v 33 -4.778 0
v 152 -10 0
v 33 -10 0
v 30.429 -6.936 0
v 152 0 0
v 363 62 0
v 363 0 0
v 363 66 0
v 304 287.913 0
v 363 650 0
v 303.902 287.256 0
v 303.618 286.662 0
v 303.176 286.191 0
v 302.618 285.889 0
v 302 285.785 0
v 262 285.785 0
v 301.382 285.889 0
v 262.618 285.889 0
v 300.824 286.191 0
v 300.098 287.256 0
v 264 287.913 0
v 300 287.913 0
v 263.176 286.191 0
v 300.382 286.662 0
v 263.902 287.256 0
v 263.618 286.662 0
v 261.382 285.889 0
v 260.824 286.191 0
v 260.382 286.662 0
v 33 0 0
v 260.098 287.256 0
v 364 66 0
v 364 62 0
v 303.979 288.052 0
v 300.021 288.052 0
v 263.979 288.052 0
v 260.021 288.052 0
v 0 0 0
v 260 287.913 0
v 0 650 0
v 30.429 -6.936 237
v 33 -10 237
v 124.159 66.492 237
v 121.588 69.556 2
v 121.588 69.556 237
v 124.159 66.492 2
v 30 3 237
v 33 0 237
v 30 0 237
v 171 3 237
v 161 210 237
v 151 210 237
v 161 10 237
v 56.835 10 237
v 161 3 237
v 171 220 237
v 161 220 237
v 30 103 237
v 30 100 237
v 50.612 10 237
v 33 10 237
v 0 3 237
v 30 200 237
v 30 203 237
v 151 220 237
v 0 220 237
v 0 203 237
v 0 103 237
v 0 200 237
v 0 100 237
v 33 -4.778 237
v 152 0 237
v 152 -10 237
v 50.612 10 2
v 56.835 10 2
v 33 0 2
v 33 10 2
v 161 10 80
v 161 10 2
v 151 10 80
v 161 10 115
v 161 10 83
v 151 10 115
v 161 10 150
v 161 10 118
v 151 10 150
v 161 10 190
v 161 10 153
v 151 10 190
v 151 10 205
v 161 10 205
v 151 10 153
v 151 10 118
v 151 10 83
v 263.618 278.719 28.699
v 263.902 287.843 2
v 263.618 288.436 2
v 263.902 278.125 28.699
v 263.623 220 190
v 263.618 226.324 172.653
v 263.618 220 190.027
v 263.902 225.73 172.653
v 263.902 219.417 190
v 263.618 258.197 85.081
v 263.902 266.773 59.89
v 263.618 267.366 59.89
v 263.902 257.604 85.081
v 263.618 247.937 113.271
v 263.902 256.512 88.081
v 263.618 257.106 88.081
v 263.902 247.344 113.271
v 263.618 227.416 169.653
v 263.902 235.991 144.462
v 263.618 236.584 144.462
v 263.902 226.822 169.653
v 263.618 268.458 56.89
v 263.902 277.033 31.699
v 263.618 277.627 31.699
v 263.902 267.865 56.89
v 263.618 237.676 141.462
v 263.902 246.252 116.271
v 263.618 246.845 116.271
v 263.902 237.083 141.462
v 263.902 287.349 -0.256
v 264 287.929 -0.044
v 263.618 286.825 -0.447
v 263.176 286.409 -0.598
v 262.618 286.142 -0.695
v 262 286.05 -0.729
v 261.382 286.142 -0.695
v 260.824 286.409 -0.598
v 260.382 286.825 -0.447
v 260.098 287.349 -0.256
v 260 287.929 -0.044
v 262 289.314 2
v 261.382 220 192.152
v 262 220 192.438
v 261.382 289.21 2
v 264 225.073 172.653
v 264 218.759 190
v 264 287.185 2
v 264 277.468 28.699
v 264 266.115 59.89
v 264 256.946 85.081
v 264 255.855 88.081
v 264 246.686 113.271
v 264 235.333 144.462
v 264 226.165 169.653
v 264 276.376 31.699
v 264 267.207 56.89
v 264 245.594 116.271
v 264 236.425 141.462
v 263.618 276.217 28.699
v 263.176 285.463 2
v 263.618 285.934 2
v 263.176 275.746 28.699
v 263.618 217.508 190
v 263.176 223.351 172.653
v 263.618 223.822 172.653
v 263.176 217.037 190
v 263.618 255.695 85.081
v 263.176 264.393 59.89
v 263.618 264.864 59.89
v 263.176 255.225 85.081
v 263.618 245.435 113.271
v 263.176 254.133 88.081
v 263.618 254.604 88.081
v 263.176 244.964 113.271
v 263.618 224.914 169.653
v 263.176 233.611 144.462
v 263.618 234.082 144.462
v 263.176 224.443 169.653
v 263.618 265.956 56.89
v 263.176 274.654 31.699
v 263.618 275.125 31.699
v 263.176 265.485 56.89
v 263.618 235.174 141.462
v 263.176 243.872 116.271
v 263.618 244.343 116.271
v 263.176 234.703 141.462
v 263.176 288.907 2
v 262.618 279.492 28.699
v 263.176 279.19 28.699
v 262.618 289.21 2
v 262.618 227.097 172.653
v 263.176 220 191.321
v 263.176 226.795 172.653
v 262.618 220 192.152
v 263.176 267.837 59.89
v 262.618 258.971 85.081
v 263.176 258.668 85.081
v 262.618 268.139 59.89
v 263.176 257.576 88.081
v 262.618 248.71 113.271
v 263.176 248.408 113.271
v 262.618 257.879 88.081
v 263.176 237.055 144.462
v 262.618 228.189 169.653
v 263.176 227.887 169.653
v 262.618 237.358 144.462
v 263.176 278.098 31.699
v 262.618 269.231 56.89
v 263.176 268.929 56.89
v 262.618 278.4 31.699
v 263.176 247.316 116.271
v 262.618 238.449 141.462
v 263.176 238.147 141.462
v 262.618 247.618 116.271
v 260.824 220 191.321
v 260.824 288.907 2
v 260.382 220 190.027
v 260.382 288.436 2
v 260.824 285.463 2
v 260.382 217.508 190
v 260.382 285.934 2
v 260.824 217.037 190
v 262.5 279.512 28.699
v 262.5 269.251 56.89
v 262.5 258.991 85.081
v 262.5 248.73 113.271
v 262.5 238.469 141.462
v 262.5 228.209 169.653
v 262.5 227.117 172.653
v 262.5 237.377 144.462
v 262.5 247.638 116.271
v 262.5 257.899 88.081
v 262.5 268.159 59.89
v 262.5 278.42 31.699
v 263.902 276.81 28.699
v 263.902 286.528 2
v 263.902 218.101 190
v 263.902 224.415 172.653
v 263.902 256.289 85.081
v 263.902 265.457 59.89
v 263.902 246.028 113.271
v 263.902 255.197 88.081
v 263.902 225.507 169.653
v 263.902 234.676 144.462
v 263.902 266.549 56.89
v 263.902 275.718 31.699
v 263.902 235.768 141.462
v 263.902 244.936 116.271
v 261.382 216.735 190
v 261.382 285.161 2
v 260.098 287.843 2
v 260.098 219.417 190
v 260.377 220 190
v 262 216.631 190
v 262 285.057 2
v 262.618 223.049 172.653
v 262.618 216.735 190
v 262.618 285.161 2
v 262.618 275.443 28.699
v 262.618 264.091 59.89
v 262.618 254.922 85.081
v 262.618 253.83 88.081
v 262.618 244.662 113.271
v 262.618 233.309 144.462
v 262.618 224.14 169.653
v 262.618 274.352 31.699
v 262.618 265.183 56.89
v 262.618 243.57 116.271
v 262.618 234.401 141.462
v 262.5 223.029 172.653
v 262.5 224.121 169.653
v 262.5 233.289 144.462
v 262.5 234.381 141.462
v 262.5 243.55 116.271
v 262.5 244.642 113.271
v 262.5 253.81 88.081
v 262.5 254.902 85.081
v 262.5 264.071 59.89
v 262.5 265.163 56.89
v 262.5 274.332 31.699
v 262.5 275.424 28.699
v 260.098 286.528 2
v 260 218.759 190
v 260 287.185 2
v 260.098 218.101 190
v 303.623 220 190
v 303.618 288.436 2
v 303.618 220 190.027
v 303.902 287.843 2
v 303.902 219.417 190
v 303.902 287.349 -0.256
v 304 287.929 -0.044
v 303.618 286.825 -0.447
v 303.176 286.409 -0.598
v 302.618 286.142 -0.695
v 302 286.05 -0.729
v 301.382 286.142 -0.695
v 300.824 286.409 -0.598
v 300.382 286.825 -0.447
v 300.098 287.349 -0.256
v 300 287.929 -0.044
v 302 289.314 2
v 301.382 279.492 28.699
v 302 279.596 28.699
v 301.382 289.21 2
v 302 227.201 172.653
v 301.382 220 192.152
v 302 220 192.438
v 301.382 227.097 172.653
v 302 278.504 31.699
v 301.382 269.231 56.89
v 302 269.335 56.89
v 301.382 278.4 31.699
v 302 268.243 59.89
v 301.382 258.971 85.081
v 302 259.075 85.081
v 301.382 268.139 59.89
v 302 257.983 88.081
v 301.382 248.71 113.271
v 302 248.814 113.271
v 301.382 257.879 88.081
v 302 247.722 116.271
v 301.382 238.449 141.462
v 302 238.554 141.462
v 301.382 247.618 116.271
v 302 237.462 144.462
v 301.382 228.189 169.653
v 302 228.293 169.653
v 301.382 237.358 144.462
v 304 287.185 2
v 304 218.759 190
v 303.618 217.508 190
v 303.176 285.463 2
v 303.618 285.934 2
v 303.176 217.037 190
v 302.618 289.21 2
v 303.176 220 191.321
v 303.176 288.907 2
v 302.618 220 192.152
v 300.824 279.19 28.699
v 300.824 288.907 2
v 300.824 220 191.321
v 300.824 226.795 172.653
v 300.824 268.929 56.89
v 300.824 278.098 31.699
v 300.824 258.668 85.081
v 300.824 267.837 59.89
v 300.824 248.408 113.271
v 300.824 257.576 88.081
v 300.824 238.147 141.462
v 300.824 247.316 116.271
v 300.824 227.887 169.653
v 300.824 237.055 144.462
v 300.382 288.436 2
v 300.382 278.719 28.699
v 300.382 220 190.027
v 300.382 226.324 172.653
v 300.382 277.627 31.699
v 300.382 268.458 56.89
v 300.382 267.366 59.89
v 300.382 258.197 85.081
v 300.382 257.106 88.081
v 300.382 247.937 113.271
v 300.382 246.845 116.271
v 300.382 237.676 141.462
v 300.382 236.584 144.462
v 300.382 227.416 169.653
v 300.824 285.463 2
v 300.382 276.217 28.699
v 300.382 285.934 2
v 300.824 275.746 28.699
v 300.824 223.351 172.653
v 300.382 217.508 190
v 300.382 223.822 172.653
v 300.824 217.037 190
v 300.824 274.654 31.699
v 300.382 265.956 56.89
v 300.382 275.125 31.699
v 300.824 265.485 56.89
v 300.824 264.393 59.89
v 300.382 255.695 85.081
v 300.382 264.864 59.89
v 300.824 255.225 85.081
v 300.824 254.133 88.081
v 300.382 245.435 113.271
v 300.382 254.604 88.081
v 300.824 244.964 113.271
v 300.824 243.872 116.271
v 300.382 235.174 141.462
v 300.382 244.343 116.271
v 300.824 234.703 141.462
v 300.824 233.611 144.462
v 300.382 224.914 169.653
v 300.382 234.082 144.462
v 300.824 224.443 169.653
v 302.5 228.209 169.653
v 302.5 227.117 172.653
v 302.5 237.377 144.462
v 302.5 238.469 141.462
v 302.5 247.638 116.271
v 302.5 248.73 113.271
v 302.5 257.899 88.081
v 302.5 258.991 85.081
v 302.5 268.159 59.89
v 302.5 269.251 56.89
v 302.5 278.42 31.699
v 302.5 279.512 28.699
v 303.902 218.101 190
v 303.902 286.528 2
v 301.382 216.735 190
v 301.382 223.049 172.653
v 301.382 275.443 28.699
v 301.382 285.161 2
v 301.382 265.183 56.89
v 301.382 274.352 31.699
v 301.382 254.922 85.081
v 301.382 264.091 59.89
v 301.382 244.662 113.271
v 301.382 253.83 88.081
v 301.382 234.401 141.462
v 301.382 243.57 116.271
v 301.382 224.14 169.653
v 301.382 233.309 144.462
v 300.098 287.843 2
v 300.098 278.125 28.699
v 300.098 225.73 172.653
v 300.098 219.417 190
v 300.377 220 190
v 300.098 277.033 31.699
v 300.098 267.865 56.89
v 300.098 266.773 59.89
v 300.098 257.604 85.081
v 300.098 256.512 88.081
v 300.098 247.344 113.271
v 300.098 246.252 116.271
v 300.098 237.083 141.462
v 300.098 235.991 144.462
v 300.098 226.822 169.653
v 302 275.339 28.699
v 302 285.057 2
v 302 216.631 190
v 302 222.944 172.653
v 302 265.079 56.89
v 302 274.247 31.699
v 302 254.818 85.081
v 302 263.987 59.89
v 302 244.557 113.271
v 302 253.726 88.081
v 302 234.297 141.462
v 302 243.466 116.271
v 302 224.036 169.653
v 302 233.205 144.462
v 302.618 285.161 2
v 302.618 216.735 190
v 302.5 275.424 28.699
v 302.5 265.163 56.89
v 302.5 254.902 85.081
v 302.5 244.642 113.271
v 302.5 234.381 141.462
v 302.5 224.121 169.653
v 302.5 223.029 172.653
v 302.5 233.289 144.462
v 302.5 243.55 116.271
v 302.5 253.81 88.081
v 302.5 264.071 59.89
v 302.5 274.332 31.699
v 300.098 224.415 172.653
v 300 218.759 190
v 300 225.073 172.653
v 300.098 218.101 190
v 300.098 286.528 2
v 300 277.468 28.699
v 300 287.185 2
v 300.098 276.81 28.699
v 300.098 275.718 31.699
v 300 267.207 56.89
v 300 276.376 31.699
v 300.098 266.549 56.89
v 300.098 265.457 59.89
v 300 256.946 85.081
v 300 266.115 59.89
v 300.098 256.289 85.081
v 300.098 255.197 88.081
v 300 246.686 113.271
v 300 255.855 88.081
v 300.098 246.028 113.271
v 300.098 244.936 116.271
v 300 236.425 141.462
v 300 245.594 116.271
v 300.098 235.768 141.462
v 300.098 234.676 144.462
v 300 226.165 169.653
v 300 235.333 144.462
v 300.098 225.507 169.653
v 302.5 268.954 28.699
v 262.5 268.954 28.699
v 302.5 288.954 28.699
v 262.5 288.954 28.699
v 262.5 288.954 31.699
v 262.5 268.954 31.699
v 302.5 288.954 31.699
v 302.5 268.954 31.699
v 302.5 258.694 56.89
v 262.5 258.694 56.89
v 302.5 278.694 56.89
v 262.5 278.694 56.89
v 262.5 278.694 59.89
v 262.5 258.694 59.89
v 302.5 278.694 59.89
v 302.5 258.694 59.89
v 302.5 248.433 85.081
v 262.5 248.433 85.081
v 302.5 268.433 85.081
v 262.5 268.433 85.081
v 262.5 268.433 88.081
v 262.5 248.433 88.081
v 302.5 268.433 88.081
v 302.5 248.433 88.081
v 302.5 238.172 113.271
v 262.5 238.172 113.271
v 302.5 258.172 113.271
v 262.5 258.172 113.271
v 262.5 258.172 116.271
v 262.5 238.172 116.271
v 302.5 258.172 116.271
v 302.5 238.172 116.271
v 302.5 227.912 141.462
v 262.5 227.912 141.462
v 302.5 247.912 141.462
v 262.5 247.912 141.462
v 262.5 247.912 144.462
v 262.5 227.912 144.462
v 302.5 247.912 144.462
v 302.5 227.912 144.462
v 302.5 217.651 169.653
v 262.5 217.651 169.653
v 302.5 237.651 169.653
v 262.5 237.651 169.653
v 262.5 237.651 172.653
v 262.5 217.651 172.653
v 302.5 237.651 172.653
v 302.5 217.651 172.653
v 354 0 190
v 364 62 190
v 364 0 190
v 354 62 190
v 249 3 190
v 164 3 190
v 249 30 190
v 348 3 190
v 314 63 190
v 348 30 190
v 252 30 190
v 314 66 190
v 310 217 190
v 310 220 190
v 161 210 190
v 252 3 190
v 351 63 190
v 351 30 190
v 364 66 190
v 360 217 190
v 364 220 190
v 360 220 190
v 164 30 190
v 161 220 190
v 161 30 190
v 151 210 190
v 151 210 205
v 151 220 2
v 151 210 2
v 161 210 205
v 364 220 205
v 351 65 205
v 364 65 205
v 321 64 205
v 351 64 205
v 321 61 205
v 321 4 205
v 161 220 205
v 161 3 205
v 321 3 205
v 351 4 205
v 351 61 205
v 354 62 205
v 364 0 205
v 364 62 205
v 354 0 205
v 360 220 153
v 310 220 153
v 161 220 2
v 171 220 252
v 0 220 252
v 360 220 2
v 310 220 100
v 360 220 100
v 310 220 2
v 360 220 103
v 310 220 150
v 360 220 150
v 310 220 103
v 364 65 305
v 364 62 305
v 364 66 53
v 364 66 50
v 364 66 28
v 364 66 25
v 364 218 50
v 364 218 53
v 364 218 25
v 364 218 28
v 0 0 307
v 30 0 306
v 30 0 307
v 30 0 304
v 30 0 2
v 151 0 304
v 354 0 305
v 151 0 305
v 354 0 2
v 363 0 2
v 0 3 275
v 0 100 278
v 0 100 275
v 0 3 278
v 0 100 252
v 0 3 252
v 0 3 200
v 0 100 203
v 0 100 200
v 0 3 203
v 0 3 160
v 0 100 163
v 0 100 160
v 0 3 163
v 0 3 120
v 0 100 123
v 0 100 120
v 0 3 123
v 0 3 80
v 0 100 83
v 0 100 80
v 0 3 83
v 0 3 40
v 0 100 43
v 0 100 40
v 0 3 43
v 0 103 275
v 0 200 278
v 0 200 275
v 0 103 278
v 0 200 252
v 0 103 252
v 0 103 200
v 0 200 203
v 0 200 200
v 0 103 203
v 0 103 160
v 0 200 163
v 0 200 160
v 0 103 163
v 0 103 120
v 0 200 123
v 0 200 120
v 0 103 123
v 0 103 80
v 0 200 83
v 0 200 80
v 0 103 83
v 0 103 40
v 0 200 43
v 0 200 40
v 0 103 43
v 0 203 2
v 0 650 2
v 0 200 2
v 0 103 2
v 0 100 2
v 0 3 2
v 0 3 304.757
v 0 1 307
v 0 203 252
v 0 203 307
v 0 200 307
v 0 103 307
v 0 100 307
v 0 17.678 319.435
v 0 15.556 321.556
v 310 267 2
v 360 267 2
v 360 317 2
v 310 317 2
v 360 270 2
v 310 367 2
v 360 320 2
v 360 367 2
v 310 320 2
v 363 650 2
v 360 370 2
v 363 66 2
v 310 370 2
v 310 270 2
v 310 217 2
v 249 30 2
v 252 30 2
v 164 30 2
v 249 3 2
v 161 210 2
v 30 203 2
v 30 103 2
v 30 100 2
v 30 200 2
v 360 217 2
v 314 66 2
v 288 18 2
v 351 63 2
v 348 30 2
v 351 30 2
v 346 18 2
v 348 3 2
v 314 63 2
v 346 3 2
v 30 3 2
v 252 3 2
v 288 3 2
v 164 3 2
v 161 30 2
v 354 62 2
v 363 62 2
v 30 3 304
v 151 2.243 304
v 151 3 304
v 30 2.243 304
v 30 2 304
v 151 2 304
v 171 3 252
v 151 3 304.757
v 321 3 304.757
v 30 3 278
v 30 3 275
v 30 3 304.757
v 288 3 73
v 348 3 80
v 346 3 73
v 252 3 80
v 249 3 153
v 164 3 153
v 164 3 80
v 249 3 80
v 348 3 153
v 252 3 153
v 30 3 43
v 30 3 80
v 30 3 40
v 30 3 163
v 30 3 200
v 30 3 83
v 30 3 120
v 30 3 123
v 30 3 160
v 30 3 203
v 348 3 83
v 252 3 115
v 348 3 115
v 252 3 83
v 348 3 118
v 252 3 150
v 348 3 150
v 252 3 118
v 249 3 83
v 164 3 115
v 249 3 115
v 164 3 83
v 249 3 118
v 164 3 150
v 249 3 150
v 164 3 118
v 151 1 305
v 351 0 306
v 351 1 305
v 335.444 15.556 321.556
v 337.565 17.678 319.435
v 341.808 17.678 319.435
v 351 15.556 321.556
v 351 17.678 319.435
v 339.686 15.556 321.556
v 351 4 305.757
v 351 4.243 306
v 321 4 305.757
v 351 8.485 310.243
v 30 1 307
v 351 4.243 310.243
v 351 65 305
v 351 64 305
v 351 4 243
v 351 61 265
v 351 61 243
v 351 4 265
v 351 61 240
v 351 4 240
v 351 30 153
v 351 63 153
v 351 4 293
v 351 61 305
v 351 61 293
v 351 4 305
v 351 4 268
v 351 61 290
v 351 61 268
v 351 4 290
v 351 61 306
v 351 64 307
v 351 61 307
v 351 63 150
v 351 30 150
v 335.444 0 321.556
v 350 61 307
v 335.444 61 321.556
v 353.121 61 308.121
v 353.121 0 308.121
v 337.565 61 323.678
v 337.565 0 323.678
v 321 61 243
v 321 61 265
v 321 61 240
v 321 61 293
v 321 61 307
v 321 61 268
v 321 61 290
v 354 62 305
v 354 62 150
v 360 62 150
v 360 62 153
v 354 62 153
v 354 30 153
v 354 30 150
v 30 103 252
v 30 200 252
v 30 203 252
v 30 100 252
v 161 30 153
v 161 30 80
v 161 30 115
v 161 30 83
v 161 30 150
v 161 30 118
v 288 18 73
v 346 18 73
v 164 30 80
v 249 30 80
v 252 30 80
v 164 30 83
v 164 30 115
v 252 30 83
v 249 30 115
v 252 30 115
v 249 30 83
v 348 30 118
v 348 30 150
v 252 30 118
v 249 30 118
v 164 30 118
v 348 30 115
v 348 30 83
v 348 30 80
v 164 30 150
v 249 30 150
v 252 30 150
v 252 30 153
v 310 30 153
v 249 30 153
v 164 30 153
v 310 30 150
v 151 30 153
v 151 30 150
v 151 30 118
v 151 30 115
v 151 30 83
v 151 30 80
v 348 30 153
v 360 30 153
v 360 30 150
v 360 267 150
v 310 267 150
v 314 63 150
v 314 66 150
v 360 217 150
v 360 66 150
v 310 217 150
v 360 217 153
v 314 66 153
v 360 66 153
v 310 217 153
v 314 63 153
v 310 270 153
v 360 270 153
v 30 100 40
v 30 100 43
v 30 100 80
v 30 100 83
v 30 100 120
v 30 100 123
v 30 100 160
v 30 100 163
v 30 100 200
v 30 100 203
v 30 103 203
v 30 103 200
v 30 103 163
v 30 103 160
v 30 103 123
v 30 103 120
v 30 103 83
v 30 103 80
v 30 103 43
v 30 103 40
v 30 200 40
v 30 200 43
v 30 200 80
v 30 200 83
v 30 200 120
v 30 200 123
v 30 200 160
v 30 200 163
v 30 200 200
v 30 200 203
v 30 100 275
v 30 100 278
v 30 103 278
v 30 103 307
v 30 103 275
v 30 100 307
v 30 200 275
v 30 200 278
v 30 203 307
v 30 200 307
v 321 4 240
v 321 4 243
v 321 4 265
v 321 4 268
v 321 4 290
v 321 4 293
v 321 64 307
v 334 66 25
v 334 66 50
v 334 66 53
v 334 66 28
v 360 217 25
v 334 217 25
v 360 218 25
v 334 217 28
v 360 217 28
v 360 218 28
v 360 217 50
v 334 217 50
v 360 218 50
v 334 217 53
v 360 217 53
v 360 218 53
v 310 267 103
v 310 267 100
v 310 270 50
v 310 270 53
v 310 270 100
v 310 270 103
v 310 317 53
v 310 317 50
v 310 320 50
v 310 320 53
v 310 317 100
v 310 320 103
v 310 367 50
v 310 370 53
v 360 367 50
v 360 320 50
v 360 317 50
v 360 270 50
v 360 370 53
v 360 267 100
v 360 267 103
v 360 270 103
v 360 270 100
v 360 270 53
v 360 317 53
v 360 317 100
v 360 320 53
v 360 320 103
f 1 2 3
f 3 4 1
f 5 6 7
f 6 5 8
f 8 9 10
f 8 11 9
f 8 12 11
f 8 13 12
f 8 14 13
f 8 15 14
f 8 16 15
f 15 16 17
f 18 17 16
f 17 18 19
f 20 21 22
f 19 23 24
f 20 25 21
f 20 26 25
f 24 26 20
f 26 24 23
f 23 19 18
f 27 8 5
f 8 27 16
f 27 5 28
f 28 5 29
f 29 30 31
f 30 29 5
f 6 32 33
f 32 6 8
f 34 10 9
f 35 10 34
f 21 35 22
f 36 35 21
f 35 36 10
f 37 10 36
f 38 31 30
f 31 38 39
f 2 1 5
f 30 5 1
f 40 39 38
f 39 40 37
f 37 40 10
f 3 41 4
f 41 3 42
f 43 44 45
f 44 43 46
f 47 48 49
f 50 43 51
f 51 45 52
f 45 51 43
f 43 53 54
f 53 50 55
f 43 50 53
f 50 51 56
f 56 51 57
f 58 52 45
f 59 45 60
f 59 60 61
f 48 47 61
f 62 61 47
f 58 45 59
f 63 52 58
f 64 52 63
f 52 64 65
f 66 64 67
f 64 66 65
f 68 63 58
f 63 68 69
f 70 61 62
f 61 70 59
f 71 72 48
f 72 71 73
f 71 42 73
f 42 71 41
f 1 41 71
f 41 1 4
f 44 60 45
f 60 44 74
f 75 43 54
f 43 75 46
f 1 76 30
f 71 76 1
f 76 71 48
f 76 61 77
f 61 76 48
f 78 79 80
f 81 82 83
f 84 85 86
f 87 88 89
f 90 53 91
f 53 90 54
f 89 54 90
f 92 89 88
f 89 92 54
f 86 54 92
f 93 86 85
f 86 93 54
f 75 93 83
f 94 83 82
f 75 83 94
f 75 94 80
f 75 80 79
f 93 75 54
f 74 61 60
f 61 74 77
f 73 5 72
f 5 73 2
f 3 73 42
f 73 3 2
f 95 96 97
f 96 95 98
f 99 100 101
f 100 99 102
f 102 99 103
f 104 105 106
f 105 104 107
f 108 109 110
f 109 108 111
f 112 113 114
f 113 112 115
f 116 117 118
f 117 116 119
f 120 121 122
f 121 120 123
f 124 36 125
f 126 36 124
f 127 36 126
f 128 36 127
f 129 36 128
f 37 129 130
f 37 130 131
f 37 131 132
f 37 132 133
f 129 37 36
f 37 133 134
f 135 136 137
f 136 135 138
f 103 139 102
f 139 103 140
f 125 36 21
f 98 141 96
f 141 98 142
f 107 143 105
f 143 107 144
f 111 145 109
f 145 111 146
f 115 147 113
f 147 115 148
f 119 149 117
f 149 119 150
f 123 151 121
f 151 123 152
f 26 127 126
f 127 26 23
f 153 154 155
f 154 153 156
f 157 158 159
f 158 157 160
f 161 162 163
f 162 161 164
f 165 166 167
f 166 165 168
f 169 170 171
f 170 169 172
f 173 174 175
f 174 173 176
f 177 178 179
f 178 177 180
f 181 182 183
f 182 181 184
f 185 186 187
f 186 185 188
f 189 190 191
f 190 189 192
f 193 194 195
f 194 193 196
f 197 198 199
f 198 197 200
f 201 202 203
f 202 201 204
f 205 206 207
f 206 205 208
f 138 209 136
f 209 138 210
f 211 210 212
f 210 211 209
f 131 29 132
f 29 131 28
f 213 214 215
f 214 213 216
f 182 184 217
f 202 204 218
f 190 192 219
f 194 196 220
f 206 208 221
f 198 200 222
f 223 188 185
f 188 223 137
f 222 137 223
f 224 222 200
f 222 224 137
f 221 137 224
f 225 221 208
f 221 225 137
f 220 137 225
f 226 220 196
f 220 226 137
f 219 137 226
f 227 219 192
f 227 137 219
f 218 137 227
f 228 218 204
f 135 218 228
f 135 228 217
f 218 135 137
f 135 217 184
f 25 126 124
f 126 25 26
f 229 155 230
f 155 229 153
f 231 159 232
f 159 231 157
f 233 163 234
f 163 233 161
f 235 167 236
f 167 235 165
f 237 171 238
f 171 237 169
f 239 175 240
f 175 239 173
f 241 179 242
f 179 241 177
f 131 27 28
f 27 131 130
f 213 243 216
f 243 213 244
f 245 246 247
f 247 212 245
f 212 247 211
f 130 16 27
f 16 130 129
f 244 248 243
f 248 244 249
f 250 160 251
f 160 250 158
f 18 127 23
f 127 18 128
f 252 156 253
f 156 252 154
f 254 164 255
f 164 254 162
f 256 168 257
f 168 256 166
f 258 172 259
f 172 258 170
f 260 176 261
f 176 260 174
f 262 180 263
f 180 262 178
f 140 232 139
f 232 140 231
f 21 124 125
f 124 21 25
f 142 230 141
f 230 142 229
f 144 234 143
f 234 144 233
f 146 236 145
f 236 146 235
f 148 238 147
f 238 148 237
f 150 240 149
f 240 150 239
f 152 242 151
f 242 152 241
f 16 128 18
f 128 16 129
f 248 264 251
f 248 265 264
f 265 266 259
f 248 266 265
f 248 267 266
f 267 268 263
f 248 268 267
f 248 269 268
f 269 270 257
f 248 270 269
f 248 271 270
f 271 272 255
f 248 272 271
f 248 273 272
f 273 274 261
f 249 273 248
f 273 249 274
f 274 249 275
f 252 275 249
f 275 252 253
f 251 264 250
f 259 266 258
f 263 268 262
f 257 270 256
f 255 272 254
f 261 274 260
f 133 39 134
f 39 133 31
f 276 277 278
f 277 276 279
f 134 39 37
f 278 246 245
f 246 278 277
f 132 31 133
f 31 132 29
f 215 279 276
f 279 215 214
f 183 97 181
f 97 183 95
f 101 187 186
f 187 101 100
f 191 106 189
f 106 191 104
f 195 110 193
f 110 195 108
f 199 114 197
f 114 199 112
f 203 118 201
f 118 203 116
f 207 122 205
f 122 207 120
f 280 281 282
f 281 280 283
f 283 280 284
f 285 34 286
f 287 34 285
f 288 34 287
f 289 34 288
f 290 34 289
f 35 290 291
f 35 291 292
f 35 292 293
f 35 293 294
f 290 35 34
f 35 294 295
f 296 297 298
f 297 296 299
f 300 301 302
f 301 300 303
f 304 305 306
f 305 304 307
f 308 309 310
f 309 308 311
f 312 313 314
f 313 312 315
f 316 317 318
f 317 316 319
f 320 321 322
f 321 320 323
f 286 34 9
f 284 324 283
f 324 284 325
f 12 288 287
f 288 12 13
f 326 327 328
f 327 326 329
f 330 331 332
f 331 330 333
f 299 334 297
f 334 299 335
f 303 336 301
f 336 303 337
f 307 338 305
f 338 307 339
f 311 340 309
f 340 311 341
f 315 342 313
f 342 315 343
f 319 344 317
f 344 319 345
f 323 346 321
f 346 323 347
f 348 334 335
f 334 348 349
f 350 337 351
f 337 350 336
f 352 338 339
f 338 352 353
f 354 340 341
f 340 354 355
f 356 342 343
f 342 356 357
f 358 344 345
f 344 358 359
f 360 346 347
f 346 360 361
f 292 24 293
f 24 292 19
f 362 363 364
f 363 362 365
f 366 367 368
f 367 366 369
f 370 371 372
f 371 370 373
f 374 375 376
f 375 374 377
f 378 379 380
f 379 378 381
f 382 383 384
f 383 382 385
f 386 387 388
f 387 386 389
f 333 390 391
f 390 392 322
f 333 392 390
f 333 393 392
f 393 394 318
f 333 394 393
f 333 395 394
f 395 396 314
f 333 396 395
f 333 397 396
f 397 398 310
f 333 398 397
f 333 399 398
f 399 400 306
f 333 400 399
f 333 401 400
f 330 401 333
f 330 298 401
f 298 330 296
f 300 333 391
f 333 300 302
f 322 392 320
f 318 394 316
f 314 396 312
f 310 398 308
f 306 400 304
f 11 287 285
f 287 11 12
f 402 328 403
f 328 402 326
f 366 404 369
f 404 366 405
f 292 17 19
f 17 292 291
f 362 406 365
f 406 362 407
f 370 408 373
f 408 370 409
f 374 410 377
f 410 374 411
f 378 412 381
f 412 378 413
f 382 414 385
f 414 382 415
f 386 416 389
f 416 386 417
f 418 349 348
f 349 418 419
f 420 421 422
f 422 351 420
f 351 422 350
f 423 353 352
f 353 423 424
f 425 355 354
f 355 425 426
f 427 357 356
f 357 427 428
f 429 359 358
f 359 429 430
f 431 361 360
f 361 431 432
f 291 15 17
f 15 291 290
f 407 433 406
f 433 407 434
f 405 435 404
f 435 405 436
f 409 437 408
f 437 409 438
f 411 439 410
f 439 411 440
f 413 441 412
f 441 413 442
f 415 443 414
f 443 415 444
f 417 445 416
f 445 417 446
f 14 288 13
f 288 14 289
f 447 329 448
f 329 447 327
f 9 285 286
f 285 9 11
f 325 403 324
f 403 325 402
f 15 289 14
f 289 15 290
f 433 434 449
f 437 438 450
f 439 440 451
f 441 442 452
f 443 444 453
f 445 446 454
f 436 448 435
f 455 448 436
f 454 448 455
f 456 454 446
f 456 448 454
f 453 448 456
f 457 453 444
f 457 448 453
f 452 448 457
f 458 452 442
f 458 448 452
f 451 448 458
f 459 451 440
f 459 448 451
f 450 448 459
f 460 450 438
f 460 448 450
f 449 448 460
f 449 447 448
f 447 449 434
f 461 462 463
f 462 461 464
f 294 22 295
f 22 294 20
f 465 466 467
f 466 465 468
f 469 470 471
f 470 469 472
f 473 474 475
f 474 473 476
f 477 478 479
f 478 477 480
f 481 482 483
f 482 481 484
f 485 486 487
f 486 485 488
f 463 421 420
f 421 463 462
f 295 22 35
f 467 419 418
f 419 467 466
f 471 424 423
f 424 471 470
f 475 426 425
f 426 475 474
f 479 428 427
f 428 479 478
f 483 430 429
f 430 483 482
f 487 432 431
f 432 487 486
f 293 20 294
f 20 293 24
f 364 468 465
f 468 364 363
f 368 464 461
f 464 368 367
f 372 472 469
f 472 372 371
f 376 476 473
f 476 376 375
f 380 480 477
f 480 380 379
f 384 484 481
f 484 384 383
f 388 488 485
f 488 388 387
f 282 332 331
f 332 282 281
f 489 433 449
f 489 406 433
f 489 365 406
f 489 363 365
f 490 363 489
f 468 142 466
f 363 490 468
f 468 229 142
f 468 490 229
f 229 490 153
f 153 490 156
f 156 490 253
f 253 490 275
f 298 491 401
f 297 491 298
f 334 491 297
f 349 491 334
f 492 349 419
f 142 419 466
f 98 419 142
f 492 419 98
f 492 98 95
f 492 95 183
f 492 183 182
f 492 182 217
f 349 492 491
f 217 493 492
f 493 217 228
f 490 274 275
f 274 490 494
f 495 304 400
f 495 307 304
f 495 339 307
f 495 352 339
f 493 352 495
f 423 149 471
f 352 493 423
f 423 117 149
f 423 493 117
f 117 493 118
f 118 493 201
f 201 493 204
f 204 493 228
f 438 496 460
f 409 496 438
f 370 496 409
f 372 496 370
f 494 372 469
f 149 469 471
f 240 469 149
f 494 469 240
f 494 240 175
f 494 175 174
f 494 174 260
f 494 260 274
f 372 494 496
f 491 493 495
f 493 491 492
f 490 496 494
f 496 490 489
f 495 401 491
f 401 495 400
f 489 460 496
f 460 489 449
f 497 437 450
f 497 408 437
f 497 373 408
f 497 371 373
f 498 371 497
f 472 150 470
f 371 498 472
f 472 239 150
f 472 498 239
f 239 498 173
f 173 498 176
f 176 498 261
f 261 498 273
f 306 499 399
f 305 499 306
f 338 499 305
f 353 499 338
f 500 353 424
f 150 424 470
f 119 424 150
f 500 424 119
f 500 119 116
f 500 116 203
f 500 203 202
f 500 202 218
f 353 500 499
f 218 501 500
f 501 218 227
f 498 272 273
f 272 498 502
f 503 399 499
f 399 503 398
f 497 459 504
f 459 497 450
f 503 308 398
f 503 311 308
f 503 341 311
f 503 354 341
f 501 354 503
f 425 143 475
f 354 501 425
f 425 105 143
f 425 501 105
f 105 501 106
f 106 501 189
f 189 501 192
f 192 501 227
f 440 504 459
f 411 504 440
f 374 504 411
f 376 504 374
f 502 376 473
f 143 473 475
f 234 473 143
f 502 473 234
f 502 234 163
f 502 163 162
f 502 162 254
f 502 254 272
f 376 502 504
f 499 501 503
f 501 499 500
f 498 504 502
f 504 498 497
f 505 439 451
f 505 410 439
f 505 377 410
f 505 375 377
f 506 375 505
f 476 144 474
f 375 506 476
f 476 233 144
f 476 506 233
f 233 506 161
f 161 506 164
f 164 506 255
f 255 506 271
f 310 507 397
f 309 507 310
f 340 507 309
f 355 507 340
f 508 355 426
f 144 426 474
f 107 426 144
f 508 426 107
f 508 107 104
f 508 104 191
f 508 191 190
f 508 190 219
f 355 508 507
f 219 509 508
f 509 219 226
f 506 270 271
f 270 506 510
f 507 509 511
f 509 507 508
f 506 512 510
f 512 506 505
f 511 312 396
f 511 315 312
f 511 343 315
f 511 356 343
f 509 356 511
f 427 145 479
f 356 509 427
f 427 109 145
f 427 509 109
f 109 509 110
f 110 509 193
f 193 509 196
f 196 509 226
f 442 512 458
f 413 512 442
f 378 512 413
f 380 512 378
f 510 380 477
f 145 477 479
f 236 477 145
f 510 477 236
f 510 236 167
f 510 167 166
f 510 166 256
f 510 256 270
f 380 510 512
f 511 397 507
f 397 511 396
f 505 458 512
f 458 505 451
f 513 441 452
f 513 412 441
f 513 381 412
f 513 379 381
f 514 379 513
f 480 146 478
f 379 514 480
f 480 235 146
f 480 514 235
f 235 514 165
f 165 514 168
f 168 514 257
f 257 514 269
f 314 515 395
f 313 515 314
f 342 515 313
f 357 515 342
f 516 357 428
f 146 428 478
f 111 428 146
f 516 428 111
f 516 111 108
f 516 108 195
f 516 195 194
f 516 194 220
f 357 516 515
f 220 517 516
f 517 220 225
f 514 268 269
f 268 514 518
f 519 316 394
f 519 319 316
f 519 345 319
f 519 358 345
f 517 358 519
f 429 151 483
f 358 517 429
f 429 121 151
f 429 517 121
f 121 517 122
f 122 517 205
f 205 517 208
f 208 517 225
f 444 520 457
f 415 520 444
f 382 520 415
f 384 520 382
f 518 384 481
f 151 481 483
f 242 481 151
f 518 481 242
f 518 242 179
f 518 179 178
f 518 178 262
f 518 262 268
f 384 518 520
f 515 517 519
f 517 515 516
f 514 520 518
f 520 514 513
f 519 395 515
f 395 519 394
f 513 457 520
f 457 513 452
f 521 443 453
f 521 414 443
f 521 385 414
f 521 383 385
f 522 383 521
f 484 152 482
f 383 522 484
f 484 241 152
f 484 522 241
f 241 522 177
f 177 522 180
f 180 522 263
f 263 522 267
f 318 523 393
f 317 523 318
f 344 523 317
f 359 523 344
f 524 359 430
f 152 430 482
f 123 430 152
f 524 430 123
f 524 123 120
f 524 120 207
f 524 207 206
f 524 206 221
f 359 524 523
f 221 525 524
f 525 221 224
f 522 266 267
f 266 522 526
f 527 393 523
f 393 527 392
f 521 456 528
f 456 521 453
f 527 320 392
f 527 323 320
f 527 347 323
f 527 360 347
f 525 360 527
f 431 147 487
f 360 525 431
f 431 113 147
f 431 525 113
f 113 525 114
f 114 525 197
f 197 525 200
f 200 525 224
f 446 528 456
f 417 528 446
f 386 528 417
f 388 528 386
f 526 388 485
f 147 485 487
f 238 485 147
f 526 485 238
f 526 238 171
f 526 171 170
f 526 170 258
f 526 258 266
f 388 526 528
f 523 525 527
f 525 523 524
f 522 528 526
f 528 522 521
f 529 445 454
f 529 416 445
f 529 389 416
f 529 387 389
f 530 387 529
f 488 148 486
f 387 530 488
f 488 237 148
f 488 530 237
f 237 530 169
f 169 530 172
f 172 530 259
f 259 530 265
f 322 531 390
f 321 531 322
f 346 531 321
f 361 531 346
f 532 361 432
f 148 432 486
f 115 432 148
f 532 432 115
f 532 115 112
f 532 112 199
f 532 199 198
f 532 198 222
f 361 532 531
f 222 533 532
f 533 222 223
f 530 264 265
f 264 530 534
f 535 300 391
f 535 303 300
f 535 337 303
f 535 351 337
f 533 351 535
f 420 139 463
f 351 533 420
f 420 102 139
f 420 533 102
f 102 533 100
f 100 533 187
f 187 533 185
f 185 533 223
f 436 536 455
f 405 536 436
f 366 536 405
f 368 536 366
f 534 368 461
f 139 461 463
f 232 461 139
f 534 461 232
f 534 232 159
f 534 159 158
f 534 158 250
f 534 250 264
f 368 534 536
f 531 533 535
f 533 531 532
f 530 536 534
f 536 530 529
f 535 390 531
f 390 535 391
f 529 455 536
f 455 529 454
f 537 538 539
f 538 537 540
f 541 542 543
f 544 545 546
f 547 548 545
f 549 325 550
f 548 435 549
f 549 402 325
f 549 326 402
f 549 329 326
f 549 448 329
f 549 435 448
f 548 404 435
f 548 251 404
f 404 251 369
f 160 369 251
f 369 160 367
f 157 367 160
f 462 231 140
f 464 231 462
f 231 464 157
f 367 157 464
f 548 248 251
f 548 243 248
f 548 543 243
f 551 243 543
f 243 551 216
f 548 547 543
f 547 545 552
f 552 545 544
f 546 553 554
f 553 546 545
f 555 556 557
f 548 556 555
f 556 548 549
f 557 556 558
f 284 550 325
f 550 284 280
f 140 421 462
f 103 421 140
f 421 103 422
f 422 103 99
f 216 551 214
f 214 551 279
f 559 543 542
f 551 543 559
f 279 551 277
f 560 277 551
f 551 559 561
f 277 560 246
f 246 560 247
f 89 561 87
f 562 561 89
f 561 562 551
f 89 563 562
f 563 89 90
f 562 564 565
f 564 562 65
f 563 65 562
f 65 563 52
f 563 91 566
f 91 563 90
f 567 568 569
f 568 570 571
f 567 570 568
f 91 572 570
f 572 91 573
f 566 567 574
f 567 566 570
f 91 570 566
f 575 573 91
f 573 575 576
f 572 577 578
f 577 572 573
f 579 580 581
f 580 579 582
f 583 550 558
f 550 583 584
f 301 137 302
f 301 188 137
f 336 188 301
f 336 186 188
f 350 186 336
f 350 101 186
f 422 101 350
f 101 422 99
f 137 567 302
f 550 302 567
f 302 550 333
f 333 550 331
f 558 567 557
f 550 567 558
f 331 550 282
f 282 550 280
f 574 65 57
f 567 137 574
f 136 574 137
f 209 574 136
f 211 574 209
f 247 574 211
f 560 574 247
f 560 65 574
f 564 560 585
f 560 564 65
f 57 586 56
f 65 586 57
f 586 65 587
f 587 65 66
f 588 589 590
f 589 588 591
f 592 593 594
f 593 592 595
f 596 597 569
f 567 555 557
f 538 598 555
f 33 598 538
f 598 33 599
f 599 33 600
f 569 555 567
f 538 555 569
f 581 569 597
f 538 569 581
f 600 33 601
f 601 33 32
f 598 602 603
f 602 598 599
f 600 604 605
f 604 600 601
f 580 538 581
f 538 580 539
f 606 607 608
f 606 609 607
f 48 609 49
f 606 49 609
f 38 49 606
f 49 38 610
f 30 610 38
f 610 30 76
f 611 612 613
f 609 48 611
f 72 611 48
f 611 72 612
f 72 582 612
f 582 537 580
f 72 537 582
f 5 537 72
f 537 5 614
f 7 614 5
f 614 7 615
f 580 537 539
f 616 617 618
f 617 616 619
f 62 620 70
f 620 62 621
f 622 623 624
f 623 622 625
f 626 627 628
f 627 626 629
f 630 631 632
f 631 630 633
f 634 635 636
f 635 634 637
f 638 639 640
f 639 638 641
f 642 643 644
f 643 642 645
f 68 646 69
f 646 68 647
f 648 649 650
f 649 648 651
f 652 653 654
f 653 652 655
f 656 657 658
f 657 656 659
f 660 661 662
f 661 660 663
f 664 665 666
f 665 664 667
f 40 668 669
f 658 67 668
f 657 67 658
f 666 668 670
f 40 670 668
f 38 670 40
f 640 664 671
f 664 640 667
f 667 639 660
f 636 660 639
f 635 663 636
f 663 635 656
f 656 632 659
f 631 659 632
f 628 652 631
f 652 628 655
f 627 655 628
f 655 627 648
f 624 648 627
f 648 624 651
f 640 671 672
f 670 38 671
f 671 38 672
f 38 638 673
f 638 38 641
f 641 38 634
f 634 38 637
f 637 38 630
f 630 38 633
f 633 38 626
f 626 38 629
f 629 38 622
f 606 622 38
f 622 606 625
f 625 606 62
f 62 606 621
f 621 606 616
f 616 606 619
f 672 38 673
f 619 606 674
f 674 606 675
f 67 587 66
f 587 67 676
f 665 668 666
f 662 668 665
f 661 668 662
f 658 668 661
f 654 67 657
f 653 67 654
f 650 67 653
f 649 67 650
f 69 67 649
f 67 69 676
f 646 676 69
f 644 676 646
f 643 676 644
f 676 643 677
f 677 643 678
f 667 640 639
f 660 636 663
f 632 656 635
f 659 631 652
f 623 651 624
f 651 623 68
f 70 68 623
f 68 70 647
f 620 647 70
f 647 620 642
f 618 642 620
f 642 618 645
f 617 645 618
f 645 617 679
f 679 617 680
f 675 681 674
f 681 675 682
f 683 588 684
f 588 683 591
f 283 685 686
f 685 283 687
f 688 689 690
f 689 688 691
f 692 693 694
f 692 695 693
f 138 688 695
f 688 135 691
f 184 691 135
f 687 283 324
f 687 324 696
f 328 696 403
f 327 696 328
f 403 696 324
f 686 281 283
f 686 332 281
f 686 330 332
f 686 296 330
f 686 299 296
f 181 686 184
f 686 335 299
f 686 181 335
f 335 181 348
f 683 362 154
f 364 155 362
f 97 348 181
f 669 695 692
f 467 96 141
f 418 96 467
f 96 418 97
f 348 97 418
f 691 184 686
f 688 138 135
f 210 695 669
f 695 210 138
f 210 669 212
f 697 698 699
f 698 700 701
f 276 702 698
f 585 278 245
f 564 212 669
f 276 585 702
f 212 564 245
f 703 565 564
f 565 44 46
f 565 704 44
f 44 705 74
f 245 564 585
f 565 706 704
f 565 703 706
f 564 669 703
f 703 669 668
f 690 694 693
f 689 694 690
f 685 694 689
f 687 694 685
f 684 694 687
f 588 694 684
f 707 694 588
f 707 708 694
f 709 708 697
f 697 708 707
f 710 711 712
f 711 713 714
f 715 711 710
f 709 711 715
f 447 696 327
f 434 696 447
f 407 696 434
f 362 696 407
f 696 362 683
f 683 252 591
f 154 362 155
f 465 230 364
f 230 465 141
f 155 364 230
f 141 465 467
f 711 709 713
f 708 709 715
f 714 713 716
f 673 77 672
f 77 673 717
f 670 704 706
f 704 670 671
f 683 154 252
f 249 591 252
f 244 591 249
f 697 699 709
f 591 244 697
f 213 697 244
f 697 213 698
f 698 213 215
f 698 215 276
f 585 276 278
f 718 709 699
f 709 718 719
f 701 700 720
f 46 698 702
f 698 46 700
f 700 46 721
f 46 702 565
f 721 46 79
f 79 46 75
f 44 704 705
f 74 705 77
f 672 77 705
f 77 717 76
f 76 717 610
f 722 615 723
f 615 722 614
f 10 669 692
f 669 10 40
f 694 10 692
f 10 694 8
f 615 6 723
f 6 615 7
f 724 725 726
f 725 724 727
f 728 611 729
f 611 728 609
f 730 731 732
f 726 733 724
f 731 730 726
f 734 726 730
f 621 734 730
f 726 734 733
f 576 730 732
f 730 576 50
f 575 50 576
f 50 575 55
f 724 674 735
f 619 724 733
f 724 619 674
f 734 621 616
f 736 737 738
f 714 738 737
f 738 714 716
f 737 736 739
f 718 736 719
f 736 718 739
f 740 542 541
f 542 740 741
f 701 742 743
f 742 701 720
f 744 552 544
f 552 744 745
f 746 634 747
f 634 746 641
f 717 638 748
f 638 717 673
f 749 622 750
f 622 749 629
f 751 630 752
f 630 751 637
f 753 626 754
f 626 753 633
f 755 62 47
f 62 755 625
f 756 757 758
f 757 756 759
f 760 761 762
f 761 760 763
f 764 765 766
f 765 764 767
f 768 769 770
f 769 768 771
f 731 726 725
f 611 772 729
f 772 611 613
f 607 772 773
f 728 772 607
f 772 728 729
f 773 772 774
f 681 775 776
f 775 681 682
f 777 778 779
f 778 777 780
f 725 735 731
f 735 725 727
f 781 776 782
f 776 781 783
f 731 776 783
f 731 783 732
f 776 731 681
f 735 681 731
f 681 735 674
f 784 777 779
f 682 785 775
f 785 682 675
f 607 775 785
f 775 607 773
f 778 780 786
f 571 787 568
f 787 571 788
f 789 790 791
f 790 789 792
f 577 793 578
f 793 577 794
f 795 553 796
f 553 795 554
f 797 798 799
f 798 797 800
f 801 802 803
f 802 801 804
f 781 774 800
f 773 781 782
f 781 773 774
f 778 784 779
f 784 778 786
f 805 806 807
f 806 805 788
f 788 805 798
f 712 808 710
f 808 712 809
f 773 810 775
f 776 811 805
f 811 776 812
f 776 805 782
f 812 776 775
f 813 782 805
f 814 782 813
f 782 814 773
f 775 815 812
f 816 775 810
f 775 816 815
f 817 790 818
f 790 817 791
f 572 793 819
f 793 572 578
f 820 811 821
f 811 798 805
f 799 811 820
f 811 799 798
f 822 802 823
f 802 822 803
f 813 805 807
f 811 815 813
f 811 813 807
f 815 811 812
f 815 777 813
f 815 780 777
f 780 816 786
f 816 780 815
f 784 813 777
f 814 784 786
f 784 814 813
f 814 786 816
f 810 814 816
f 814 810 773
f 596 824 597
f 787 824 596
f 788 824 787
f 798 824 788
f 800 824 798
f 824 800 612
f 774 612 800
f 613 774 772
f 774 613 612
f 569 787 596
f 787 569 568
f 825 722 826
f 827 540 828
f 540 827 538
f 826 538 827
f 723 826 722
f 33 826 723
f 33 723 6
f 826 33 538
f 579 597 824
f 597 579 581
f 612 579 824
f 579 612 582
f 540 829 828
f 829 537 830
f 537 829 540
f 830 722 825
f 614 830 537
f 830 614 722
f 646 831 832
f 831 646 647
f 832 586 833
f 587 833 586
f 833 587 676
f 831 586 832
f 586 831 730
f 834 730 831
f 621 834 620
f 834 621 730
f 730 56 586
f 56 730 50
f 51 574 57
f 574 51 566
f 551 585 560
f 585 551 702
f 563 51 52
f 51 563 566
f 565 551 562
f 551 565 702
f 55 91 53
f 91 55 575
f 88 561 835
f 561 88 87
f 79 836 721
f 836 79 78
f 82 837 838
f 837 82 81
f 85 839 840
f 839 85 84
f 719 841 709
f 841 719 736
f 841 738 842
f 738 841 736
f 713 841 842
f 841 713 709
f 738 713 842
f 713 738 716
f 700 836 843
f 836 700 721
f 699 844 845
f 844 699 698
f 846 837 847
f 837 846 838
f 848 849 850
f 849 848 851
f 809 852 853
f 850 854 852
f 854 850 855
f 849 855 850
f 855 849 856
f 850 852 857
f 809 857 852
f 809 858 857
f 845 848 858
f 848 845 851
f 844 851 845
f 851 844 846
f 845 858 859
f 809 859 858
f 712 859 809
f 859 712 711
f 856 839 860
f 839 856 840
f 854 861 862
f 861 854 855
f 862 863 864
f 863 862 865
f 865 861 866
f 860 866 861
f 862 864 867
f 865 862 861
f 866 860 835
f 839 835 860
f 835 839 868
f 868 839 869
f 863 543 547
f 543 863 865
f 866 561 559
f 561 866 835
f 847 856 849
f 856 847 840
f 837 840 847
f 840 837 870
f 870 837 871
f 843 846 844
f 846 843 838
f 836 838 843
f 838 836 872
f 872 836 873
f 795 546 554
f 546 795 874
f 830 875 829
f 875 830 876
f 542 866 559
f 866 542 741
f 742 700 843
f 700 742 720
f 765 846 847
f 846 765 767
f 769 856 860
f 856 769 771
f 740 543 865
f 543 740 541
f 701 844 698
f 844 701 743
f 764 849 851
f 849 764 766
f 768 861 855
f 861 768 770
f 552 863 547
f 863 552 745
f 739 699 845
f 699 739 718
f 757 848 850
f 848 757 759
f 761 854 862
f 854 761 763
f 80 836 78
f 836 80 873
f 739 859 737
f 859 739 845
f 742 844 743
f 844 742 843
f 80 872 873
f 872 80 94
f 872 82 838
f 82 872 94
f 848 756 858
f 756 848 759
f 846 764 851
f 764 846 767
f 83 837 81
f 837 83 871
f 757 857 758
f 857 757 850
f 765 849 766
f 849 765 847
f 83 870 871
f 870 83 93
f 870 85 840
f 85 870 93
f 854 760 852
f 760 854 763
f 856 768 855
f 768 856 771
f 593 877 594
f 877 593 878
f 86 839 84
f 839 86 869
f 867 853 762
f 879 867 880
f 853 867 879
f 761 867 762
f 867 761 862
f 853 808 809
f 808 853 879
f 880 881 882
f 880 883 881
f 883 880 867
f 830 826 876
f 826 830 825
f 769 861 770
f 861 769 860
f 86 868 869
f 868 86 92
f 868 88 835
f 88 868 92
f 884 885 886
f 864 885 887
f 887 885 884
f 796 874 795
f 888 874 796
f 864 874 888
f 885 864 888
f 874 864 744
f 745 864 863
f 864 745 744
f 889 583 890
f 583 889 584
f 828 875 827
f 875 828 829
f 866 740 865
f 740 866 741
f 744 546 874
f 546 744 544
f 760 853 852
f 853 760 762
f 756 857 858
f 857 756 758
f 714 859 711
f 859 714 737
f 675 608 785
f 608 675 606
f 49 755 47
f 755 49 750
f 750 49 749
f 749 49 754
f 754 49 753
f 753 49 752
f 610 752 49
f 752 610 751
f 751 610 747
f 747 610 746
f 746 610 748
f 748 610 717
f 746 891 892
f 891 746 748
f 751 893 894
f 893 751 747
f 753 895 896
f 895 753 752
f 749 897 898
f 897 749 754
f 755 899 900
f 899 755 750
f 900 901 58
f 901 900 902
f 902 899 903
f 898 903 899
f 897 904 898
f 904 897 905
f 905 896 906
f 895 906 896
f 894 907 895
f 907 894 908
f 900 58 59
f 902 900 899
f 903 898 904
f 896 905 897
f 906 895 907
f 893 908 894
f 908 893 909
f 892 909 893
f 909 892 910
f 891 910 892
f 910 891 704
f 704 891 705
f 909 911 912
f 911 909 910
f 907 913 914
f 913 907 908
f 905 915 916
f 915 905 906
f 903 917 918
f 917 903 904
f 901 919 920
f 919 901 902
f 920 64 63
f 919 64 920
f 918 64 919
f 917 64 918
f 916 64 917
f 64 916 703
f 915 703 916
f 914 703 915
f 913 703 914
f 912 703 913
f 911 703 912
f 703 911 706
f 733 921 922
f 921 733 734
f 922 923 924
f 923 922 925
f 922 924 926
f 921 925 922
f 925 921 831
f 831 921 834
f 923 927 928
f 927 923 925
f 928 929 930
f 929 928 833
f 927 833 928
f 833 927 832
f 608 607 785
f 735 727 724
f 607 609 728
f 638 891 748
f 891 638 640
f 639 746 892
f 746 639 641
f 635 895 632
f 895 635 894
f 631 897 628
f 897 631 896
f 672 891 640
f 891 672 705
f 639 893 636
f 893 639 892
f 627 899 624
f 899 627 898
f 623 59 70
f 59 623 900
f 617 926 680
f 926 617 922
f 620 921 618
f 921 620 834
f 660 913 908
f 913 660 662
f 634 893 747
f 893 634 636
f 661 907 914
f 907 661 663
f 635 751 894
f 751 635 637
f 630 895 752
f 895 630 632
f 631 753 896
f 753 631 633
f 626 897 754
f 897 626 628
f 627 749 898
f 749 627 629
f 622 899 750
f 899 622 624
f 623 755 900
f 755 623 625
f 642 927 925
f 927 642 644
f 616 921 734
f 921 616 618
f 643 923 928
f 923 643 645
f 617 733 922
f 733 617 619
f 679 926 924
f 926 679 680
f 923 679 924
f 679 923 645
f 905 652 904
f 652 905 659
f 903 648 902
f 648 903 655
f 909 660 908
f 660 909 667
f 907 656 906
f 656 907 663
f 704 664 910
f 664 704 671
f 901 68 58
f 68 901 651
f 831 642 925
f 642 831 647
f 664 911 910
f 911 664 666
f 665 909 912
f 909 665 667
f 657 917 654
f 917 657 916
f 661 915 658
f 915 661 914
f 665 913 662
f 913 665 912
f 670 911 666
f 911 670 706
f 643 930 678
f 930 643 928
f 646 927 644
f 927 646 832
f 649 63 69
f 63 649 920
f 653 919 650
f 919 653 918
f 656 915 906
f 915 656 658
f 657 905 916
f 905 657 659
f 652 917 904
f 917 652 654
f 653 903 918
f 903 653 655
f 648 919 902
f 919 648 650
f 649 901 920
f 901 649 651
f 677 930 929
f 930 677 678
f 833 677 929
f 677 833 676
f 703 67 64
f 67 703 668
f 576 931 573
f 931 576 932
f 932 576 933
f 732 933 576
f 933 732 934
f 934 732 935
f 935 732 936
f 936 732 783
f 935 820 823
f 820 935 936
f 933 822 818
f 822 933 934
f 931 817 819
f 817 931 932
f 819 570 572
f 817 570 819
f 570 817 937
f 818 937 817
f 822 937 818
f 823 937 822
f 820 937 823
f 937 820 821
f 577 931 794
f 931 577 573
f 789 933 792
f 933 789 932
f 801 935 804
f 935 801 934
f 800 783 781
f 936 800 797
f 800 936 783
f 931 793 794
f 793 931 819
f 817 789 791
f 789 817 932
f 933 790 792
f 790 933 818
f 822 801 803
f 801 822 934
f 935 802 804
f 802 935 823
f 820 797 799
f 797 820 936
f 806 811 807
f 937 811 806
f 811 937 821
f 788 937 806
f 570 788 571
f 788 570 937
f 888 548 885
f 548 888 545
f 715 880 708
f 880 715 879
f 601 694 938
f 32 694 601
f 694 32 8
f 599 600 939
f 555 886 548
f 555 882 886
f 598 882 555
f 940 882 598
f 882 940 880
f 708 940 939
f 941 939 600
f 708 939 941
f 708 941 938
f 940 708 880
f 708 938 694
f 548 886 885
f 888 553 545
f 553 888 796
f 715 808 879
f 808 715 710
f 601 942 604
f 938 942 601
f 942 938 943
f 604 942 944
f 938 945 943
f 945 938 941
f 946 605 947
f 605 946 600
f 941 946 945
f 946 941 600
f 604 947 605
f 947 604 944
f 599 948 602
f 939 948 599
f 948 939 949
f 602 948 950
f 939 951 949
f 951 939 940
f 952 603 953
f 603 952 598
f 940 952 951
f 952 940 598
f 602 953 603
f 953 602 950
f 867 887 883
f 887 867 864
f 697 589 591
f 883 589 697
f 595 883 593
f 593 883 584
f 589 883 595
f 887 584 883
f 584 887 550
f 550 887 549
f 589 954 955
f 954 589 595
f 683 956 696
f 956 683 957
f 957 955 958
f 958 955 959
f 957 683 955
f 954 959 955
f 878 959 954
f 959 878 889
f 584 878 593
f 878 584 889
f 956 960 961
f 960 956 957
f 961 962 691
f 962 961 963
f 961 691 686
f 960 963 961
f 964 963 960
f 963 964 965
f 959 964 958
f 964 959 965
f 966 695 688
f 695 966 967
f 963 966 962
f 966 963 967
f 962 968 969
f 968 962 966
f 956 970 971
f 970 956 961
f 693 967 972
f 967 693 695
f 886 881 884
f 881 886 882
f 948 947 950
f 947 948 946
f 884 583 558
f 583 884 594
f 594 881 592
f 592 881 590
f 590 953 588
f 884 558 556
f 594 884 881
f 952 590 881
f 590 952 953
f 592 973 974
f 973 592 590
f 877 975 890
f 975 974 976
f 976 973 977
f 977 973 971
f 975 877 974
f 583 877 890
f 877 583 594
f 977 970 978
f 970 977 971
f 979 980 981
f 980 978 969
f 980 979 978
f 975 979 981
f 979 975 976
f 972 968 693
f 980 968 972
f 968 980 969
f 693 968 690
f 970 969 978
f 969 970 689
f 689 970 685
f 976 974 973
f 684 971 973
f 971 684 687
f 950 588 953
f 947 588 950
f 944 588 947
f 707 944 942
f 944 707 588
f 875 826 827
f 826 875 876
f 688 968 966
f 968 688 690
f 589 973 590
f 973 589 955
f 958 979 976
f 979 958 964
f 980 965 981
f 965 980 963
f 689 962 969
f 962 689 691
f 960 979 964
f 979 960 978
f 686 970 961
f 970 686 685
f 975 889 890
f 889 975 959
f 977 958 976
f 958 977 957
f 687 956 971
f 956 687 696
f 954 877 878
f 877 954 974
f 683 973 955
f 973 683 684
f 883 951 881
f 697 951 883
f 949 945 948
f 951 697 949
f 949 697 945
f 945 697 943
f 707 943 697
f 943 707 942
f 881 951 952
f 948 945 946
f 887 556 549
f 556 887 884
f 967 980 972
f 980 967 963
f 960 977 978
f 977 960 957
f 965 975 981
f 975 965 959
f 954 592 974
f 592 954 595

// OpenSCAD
module cube(x,y,z){ 
    linear_extrude(height = z)
        square([x, y]);
}  

module schrankweiss(x=0,y=0){
    color("white")
    translate([x,y, 0])
    cube(60,112,200);
}

module schrankbraun(x=0,y=0){
    color("#AA8800")
    translate([x,y,0])
    cube(53,118,198);
}

module heizung(x=0,y=0){
    color("#666666")
    translate([x,y,0])
    cube(58,18,73);
}

module matratze(x=0, y=0, mycolor="beige", height=0){
    color(mycolor)
    translate([x,y,height])
    cube(135,200,31.5);
}

module hochebene1(x=0, y=0, height=237){
    color("#aa7700",0.5)
    translate([x,y,height])
    cube(171,220,15);   
//    translate([x+171,y,height-37])
//    cube(15,220,52);  
    
}


module hochebene2(x=0, y=0, height=190){
    color("#aa7700",0.5)
    translate([151,y,height])
    cube(213,220,15); 
    translate([0,80,-72])
    rotate([20,0,0])
    leiter(x+260,y+220)
    ;
}

module brett(x=0, y=0, height=100){    
    color("#aa7700",0.5)
    translate([x,y,height])
    cube(200,30,3);
}


module brett2(x=0, y=0, height=100){    
    color("#aa7700",0.5)
    translate([x,y,height])
    cube(30,100,3);
}

module brett3(x=0, y=0, height=100){    
    color("#aa7700",0.5)
    translate([x,y,height])
    cube(30,61,3);
}

module brett4(x=0, y=0, height=100){    
    color("#aa7700",0.5)
    translate([x,y,height])
    cube(30,155,3);
}

module regalwand1(x=0, y=0, height=0){
    color("#aa7700",0.5)
    translate([x,y,height])
    cube(3,30,190);
}


module regalwand2(x=0, y=0, height=0){
    color("#aa7700",0.5)
    translate([x,y,0])
    cube(30,3,307);
}

module regalwand3(x=0, y=0, height=0){
    color("#aa7700",0.5)
    translate([x,y,200])
    cube(30,3,107);
}

module regalwand4(x=0, y=0, height=0){
    color("#aa7700",0.5)
    translate([x,y,0])
    cube(50,3,190);
}



module leiter(x=0, y=0){
    translate([x,y,0])    
    holm(0,0);
    translate([x,y,0])    
    holm(40,0); 
    sprosse(x+2.5,y-8,3,30);   
    sprosse(x+2.5,y-8,3,60);  
    sprosse(x+2.5,y-8,3,90);  
    sprosse(x+2.5,y-8,3,120);  
    sprosse(x+2.5,y-8,3,150);  
    sprosse(x+2.5,y-8,3,180);
}

module holm(x=0, y=0, dicke=5){
    translate([x,y,104])
    linear_extrude(height = 215, center = true)
    translate([2, 0, 0])
    circle(r = 2,$fn=20);    
//    cube(dicke,dicke,210);
}

module stange(x=0, y=0, dicke=5){
    color("black")
    translate([x,y,150])    
    cube(2,140,2);
}



module sprosse(x=0, y=0, dicke=3, hoehe=0){
    translate([x,y,hoehe])  
    rotate([-20,0,0])  
    cube(40,20,dicke);
}


module kindermatratze(x=0, y=0, mycolor="beige", height=0){
    color(mycolor)
    translate([x,y,height])
    cube(80,180,20);
}

module pfosten(x=0, y=0, dicke=10){
    translate([x,y,0])    
    cube(dicke,dicke,237);
}

module regal(x=0, y=0){
    color("black")
    translate([x,y,0])
    cube(150,40,150);
}

module kaefig(x=0, y=0){
    color("green" ,0.5)
    translate([x,y,0])
    cube(50,100,70.5);
}

module schreibtisch(x=0, y=0){
    color("red" ,0.5)
    translate([x,y,200])
    cube(108,54,72);
}

//module bett(x=0,y=0){
//    kindermatratze(x,y,"beige",0);
//    kindermatratze(x,y,"beige",100);
//    pfosten(x,y,10);
//    pfosten(x+70,y,10);
//    pfosten(x,y+170,10);
//    pfosten(x+70,y+170,10);
//}
 
 
 
module door(x,y){
    color("#555555",0.4)
    translate([x,y-10,0])
    rotate([0,0,40])
    cube(119,4,237);
//    
    color("#ffffff",0.1)
    translate([x,y-10,0]) 
    cube(119,20,237);
}

module wall(x,y,offsetX,offsetY){
    color("#ffffff")
    translate([offsetX, offsetY,0])
        cube(x,y,305);
}

module stuck(x,offsetX,offsetY){    
    color("blue", 0.25) 
    translate([offsetX, offsetY,306]) 
    rotate([330,0,0])
    rotate([0,0,0])
    cube(x, 3, 16);
}

module vorhang(x,y){
    color("pink", 0.5)
    translate([x, y, 10])
        linear_extrude(height = 190, twist = 5)
            square([1, 140]);
}

module flurwall(x,offsetX,offsetY){
    wall(x,3,offsetX,offsetY);
}

module upperflurwall(x,offsetX,offsetY){
    color("#ffffff")
    translate([offsetX, offsetY, 237])
        linear_extrude(height = 67)
            square([x, 3]);
}



module peggywall(y,offsetX,offsetY){
    wall(3,y,offsetX,offsetY);
}

module myfloor(points){
    color("#664400",0.5)   
    polyhedron(
        points=points,
        faces=[[0,1,2,3,4,5,6,7]]
    );   
}
 

//translate([150,160])
//    circle(90);


myfloor([[0,0],[351,0],[351,62],[363,62],[363,650],[-90,650],[-90,450],[0,350]]);

cube(363,650,2);

upperflurwall(151,0,0);
color("blue", 0.25) 
translate([0, 0,306]) 
rotate([315,0,0]) 
cube(351, 3, 22);

//color("blue", 0.25) 
//translate([0, 0,306]) 
//rotate([0,45,0]) 
//cube(3, 200, 22);

color("blue", 0.25) 
translate([351, 0,306]) 
rotate([0,315,0]) 
cube(3, 61, 22);
 
flurwall(200,151,0);
flurwall(13,351,62);
peggywall(62,351,0);   
//peggywall(590,363,62);      
            
door(33,0);

//schrankweiss(300,540);
//schrankbraun(307,261);

//matratze(50,510);
//matratze(50,510,"white",32);

//regal(322,350);
//kaefig(310,450);

//schreibtisch(200,0);

//bett(220,6S0);
 

hochebene1(0,0);
hochebene2(0,0);
pfosten(151,210);
pfosten(151,0);
//matratze(30,0,"white",247);
//matratze(185,0,"white",200);

heizung(288,0);

regalwand1(161,0);
regalwand1(249,0);
//brett(151,0,40);
brett(151,0,80);
brett(151,0,115);
brett(151,0,150);
regalwand1(348,0);
 
 

regalwand2(0,0); 
brett2(0,0,40);
brett2(0,0,80);
brett2(0,0,120);
brett2(0,0,160);
brett2(0,0,200);
//
//brett2(0,0,240);
brett2(0,0,275);
//brett2(0,0,290); 
regalwand2(0,100); 
//brett2(0,100,265);  
brett2(0,100,40);
brett2(0,100,80);
brett2(0,100,120);
brett2(0,100,160);
brett2(0,100,200);
brett2(0,100,275);  
regalwand2(0,200); 
 

regalwand3(321,1);  
brett3(321,0,240);
brett3(321,0,265);
brett3(321,0,290); 
regalwand3(321,61);  

//vorhang(300,61);
//stange(340,61); 


regalwand4(314,63); 
brett4(334,63,25);
brett4(334,63,50); 
//brett4(334,63,150); 
//regalwand4(314,210);


//translate([50,210,60])
//    linear_extrude(height = 300, twist = 2600)
//        scale([1.5,.5])circle(d=4);
//        
//translate([290,180,190])
//    color("#222222")
//        rotate([90,0,0])
//            linear_extrude(height = 100, twist = 12600)
//                scale([1.5,.5])circle(d=4);
//                
//translate([270,180,190])
//    color("#222222")
//        rotate([90,0,0])
//            linear_extrude(height = 100, twist = 12600)
//                scale([1.5,.5])circle(d=4);
//                
//translate([250,180,190])
//    color("#222222")
//        rotate([90,0,0])
//            linear_extrude(height = 100, twist = 12600)
//                scale([1.5,.5])circle(d=4);
//                
//translate([230,180,190])
//    color("#222222")
//        rotate([90,0,0])
//            linear_extrude(height = 100, twist = 12600)
//                scale([1.5,.5])circle(d=4);
//                
//translate([210,180,190])
//    color("#222222")
//        rotate([90,0,0])
//            linear_extrude(height = 100, twist = 12600)
//                scale([1.5,.5])circle(d=4);
//                
//translate([190,180,190])
//    color("#222222")
//        rotate([90,0,0])
//            linear_extrude(height = 100, twist = 12600)
//                scale([1.5,.5])circle(d=4);
                 
                
//translate([250,80,200])
//    color("blue")
//        linear_extrude(height = 55, twist = 99)
//            scale([1.2,.7])circle(d=40);
        
        
//translate([361,380,20])
//    color("turquoise", 0.3)
//    cube(2,80,180);
                
 
translate([310,367,0])
    color("#aa7700",0.5)
    cube(50,3,50); 
translate([310,317,0])
    color("#aa7700",0.5)
    cube(50,3,100); 
translate([310,267,0])
    color("#aa7700",0.5)
    cube(50,3,150); 
translate([310,217,0])
    color("#aa7700",0.5)
    cube(50,3,200); 
    
     
translate([310,270,50])
    color("#aa7700",0.5)
    cube(50,100,3); 
translate([310,220,100])
    color("#aa7700",0.5)
    cube(50,100,3); 
translate([310,30,150])
    color("#aa7700",0.5)
    cube(50,240,3); 
    
color("#00cc00")
    translate([100,220,237])
    rotate([90,0,180])
    text("1");
    
color("#00cc00")
    translate([250,220,190])
    rotate([90,0,180])
    text("2");
    
color("#00cc00")
    translate([340,320,75])
    rotate([90,0,180])
    text("3"); 
    
color("#00cc00")
    translate([20,205,175])
    rotate([90,0,180])
    text("4");
    
color("#00cc00")
    translate([340,65,270])
    rotate([90,0,180])
    text("5");
    

color("#00cc00")
    translate([250,35,120])
    rotate([90,0,180])
    text("6");
    
color("#00cc00")
    translate([330,75,80])
    rotate([90,0,180])
    text("7");
                
                
                
            

 
 
  
 
 




            
            
 
                        

            
            
            
            
